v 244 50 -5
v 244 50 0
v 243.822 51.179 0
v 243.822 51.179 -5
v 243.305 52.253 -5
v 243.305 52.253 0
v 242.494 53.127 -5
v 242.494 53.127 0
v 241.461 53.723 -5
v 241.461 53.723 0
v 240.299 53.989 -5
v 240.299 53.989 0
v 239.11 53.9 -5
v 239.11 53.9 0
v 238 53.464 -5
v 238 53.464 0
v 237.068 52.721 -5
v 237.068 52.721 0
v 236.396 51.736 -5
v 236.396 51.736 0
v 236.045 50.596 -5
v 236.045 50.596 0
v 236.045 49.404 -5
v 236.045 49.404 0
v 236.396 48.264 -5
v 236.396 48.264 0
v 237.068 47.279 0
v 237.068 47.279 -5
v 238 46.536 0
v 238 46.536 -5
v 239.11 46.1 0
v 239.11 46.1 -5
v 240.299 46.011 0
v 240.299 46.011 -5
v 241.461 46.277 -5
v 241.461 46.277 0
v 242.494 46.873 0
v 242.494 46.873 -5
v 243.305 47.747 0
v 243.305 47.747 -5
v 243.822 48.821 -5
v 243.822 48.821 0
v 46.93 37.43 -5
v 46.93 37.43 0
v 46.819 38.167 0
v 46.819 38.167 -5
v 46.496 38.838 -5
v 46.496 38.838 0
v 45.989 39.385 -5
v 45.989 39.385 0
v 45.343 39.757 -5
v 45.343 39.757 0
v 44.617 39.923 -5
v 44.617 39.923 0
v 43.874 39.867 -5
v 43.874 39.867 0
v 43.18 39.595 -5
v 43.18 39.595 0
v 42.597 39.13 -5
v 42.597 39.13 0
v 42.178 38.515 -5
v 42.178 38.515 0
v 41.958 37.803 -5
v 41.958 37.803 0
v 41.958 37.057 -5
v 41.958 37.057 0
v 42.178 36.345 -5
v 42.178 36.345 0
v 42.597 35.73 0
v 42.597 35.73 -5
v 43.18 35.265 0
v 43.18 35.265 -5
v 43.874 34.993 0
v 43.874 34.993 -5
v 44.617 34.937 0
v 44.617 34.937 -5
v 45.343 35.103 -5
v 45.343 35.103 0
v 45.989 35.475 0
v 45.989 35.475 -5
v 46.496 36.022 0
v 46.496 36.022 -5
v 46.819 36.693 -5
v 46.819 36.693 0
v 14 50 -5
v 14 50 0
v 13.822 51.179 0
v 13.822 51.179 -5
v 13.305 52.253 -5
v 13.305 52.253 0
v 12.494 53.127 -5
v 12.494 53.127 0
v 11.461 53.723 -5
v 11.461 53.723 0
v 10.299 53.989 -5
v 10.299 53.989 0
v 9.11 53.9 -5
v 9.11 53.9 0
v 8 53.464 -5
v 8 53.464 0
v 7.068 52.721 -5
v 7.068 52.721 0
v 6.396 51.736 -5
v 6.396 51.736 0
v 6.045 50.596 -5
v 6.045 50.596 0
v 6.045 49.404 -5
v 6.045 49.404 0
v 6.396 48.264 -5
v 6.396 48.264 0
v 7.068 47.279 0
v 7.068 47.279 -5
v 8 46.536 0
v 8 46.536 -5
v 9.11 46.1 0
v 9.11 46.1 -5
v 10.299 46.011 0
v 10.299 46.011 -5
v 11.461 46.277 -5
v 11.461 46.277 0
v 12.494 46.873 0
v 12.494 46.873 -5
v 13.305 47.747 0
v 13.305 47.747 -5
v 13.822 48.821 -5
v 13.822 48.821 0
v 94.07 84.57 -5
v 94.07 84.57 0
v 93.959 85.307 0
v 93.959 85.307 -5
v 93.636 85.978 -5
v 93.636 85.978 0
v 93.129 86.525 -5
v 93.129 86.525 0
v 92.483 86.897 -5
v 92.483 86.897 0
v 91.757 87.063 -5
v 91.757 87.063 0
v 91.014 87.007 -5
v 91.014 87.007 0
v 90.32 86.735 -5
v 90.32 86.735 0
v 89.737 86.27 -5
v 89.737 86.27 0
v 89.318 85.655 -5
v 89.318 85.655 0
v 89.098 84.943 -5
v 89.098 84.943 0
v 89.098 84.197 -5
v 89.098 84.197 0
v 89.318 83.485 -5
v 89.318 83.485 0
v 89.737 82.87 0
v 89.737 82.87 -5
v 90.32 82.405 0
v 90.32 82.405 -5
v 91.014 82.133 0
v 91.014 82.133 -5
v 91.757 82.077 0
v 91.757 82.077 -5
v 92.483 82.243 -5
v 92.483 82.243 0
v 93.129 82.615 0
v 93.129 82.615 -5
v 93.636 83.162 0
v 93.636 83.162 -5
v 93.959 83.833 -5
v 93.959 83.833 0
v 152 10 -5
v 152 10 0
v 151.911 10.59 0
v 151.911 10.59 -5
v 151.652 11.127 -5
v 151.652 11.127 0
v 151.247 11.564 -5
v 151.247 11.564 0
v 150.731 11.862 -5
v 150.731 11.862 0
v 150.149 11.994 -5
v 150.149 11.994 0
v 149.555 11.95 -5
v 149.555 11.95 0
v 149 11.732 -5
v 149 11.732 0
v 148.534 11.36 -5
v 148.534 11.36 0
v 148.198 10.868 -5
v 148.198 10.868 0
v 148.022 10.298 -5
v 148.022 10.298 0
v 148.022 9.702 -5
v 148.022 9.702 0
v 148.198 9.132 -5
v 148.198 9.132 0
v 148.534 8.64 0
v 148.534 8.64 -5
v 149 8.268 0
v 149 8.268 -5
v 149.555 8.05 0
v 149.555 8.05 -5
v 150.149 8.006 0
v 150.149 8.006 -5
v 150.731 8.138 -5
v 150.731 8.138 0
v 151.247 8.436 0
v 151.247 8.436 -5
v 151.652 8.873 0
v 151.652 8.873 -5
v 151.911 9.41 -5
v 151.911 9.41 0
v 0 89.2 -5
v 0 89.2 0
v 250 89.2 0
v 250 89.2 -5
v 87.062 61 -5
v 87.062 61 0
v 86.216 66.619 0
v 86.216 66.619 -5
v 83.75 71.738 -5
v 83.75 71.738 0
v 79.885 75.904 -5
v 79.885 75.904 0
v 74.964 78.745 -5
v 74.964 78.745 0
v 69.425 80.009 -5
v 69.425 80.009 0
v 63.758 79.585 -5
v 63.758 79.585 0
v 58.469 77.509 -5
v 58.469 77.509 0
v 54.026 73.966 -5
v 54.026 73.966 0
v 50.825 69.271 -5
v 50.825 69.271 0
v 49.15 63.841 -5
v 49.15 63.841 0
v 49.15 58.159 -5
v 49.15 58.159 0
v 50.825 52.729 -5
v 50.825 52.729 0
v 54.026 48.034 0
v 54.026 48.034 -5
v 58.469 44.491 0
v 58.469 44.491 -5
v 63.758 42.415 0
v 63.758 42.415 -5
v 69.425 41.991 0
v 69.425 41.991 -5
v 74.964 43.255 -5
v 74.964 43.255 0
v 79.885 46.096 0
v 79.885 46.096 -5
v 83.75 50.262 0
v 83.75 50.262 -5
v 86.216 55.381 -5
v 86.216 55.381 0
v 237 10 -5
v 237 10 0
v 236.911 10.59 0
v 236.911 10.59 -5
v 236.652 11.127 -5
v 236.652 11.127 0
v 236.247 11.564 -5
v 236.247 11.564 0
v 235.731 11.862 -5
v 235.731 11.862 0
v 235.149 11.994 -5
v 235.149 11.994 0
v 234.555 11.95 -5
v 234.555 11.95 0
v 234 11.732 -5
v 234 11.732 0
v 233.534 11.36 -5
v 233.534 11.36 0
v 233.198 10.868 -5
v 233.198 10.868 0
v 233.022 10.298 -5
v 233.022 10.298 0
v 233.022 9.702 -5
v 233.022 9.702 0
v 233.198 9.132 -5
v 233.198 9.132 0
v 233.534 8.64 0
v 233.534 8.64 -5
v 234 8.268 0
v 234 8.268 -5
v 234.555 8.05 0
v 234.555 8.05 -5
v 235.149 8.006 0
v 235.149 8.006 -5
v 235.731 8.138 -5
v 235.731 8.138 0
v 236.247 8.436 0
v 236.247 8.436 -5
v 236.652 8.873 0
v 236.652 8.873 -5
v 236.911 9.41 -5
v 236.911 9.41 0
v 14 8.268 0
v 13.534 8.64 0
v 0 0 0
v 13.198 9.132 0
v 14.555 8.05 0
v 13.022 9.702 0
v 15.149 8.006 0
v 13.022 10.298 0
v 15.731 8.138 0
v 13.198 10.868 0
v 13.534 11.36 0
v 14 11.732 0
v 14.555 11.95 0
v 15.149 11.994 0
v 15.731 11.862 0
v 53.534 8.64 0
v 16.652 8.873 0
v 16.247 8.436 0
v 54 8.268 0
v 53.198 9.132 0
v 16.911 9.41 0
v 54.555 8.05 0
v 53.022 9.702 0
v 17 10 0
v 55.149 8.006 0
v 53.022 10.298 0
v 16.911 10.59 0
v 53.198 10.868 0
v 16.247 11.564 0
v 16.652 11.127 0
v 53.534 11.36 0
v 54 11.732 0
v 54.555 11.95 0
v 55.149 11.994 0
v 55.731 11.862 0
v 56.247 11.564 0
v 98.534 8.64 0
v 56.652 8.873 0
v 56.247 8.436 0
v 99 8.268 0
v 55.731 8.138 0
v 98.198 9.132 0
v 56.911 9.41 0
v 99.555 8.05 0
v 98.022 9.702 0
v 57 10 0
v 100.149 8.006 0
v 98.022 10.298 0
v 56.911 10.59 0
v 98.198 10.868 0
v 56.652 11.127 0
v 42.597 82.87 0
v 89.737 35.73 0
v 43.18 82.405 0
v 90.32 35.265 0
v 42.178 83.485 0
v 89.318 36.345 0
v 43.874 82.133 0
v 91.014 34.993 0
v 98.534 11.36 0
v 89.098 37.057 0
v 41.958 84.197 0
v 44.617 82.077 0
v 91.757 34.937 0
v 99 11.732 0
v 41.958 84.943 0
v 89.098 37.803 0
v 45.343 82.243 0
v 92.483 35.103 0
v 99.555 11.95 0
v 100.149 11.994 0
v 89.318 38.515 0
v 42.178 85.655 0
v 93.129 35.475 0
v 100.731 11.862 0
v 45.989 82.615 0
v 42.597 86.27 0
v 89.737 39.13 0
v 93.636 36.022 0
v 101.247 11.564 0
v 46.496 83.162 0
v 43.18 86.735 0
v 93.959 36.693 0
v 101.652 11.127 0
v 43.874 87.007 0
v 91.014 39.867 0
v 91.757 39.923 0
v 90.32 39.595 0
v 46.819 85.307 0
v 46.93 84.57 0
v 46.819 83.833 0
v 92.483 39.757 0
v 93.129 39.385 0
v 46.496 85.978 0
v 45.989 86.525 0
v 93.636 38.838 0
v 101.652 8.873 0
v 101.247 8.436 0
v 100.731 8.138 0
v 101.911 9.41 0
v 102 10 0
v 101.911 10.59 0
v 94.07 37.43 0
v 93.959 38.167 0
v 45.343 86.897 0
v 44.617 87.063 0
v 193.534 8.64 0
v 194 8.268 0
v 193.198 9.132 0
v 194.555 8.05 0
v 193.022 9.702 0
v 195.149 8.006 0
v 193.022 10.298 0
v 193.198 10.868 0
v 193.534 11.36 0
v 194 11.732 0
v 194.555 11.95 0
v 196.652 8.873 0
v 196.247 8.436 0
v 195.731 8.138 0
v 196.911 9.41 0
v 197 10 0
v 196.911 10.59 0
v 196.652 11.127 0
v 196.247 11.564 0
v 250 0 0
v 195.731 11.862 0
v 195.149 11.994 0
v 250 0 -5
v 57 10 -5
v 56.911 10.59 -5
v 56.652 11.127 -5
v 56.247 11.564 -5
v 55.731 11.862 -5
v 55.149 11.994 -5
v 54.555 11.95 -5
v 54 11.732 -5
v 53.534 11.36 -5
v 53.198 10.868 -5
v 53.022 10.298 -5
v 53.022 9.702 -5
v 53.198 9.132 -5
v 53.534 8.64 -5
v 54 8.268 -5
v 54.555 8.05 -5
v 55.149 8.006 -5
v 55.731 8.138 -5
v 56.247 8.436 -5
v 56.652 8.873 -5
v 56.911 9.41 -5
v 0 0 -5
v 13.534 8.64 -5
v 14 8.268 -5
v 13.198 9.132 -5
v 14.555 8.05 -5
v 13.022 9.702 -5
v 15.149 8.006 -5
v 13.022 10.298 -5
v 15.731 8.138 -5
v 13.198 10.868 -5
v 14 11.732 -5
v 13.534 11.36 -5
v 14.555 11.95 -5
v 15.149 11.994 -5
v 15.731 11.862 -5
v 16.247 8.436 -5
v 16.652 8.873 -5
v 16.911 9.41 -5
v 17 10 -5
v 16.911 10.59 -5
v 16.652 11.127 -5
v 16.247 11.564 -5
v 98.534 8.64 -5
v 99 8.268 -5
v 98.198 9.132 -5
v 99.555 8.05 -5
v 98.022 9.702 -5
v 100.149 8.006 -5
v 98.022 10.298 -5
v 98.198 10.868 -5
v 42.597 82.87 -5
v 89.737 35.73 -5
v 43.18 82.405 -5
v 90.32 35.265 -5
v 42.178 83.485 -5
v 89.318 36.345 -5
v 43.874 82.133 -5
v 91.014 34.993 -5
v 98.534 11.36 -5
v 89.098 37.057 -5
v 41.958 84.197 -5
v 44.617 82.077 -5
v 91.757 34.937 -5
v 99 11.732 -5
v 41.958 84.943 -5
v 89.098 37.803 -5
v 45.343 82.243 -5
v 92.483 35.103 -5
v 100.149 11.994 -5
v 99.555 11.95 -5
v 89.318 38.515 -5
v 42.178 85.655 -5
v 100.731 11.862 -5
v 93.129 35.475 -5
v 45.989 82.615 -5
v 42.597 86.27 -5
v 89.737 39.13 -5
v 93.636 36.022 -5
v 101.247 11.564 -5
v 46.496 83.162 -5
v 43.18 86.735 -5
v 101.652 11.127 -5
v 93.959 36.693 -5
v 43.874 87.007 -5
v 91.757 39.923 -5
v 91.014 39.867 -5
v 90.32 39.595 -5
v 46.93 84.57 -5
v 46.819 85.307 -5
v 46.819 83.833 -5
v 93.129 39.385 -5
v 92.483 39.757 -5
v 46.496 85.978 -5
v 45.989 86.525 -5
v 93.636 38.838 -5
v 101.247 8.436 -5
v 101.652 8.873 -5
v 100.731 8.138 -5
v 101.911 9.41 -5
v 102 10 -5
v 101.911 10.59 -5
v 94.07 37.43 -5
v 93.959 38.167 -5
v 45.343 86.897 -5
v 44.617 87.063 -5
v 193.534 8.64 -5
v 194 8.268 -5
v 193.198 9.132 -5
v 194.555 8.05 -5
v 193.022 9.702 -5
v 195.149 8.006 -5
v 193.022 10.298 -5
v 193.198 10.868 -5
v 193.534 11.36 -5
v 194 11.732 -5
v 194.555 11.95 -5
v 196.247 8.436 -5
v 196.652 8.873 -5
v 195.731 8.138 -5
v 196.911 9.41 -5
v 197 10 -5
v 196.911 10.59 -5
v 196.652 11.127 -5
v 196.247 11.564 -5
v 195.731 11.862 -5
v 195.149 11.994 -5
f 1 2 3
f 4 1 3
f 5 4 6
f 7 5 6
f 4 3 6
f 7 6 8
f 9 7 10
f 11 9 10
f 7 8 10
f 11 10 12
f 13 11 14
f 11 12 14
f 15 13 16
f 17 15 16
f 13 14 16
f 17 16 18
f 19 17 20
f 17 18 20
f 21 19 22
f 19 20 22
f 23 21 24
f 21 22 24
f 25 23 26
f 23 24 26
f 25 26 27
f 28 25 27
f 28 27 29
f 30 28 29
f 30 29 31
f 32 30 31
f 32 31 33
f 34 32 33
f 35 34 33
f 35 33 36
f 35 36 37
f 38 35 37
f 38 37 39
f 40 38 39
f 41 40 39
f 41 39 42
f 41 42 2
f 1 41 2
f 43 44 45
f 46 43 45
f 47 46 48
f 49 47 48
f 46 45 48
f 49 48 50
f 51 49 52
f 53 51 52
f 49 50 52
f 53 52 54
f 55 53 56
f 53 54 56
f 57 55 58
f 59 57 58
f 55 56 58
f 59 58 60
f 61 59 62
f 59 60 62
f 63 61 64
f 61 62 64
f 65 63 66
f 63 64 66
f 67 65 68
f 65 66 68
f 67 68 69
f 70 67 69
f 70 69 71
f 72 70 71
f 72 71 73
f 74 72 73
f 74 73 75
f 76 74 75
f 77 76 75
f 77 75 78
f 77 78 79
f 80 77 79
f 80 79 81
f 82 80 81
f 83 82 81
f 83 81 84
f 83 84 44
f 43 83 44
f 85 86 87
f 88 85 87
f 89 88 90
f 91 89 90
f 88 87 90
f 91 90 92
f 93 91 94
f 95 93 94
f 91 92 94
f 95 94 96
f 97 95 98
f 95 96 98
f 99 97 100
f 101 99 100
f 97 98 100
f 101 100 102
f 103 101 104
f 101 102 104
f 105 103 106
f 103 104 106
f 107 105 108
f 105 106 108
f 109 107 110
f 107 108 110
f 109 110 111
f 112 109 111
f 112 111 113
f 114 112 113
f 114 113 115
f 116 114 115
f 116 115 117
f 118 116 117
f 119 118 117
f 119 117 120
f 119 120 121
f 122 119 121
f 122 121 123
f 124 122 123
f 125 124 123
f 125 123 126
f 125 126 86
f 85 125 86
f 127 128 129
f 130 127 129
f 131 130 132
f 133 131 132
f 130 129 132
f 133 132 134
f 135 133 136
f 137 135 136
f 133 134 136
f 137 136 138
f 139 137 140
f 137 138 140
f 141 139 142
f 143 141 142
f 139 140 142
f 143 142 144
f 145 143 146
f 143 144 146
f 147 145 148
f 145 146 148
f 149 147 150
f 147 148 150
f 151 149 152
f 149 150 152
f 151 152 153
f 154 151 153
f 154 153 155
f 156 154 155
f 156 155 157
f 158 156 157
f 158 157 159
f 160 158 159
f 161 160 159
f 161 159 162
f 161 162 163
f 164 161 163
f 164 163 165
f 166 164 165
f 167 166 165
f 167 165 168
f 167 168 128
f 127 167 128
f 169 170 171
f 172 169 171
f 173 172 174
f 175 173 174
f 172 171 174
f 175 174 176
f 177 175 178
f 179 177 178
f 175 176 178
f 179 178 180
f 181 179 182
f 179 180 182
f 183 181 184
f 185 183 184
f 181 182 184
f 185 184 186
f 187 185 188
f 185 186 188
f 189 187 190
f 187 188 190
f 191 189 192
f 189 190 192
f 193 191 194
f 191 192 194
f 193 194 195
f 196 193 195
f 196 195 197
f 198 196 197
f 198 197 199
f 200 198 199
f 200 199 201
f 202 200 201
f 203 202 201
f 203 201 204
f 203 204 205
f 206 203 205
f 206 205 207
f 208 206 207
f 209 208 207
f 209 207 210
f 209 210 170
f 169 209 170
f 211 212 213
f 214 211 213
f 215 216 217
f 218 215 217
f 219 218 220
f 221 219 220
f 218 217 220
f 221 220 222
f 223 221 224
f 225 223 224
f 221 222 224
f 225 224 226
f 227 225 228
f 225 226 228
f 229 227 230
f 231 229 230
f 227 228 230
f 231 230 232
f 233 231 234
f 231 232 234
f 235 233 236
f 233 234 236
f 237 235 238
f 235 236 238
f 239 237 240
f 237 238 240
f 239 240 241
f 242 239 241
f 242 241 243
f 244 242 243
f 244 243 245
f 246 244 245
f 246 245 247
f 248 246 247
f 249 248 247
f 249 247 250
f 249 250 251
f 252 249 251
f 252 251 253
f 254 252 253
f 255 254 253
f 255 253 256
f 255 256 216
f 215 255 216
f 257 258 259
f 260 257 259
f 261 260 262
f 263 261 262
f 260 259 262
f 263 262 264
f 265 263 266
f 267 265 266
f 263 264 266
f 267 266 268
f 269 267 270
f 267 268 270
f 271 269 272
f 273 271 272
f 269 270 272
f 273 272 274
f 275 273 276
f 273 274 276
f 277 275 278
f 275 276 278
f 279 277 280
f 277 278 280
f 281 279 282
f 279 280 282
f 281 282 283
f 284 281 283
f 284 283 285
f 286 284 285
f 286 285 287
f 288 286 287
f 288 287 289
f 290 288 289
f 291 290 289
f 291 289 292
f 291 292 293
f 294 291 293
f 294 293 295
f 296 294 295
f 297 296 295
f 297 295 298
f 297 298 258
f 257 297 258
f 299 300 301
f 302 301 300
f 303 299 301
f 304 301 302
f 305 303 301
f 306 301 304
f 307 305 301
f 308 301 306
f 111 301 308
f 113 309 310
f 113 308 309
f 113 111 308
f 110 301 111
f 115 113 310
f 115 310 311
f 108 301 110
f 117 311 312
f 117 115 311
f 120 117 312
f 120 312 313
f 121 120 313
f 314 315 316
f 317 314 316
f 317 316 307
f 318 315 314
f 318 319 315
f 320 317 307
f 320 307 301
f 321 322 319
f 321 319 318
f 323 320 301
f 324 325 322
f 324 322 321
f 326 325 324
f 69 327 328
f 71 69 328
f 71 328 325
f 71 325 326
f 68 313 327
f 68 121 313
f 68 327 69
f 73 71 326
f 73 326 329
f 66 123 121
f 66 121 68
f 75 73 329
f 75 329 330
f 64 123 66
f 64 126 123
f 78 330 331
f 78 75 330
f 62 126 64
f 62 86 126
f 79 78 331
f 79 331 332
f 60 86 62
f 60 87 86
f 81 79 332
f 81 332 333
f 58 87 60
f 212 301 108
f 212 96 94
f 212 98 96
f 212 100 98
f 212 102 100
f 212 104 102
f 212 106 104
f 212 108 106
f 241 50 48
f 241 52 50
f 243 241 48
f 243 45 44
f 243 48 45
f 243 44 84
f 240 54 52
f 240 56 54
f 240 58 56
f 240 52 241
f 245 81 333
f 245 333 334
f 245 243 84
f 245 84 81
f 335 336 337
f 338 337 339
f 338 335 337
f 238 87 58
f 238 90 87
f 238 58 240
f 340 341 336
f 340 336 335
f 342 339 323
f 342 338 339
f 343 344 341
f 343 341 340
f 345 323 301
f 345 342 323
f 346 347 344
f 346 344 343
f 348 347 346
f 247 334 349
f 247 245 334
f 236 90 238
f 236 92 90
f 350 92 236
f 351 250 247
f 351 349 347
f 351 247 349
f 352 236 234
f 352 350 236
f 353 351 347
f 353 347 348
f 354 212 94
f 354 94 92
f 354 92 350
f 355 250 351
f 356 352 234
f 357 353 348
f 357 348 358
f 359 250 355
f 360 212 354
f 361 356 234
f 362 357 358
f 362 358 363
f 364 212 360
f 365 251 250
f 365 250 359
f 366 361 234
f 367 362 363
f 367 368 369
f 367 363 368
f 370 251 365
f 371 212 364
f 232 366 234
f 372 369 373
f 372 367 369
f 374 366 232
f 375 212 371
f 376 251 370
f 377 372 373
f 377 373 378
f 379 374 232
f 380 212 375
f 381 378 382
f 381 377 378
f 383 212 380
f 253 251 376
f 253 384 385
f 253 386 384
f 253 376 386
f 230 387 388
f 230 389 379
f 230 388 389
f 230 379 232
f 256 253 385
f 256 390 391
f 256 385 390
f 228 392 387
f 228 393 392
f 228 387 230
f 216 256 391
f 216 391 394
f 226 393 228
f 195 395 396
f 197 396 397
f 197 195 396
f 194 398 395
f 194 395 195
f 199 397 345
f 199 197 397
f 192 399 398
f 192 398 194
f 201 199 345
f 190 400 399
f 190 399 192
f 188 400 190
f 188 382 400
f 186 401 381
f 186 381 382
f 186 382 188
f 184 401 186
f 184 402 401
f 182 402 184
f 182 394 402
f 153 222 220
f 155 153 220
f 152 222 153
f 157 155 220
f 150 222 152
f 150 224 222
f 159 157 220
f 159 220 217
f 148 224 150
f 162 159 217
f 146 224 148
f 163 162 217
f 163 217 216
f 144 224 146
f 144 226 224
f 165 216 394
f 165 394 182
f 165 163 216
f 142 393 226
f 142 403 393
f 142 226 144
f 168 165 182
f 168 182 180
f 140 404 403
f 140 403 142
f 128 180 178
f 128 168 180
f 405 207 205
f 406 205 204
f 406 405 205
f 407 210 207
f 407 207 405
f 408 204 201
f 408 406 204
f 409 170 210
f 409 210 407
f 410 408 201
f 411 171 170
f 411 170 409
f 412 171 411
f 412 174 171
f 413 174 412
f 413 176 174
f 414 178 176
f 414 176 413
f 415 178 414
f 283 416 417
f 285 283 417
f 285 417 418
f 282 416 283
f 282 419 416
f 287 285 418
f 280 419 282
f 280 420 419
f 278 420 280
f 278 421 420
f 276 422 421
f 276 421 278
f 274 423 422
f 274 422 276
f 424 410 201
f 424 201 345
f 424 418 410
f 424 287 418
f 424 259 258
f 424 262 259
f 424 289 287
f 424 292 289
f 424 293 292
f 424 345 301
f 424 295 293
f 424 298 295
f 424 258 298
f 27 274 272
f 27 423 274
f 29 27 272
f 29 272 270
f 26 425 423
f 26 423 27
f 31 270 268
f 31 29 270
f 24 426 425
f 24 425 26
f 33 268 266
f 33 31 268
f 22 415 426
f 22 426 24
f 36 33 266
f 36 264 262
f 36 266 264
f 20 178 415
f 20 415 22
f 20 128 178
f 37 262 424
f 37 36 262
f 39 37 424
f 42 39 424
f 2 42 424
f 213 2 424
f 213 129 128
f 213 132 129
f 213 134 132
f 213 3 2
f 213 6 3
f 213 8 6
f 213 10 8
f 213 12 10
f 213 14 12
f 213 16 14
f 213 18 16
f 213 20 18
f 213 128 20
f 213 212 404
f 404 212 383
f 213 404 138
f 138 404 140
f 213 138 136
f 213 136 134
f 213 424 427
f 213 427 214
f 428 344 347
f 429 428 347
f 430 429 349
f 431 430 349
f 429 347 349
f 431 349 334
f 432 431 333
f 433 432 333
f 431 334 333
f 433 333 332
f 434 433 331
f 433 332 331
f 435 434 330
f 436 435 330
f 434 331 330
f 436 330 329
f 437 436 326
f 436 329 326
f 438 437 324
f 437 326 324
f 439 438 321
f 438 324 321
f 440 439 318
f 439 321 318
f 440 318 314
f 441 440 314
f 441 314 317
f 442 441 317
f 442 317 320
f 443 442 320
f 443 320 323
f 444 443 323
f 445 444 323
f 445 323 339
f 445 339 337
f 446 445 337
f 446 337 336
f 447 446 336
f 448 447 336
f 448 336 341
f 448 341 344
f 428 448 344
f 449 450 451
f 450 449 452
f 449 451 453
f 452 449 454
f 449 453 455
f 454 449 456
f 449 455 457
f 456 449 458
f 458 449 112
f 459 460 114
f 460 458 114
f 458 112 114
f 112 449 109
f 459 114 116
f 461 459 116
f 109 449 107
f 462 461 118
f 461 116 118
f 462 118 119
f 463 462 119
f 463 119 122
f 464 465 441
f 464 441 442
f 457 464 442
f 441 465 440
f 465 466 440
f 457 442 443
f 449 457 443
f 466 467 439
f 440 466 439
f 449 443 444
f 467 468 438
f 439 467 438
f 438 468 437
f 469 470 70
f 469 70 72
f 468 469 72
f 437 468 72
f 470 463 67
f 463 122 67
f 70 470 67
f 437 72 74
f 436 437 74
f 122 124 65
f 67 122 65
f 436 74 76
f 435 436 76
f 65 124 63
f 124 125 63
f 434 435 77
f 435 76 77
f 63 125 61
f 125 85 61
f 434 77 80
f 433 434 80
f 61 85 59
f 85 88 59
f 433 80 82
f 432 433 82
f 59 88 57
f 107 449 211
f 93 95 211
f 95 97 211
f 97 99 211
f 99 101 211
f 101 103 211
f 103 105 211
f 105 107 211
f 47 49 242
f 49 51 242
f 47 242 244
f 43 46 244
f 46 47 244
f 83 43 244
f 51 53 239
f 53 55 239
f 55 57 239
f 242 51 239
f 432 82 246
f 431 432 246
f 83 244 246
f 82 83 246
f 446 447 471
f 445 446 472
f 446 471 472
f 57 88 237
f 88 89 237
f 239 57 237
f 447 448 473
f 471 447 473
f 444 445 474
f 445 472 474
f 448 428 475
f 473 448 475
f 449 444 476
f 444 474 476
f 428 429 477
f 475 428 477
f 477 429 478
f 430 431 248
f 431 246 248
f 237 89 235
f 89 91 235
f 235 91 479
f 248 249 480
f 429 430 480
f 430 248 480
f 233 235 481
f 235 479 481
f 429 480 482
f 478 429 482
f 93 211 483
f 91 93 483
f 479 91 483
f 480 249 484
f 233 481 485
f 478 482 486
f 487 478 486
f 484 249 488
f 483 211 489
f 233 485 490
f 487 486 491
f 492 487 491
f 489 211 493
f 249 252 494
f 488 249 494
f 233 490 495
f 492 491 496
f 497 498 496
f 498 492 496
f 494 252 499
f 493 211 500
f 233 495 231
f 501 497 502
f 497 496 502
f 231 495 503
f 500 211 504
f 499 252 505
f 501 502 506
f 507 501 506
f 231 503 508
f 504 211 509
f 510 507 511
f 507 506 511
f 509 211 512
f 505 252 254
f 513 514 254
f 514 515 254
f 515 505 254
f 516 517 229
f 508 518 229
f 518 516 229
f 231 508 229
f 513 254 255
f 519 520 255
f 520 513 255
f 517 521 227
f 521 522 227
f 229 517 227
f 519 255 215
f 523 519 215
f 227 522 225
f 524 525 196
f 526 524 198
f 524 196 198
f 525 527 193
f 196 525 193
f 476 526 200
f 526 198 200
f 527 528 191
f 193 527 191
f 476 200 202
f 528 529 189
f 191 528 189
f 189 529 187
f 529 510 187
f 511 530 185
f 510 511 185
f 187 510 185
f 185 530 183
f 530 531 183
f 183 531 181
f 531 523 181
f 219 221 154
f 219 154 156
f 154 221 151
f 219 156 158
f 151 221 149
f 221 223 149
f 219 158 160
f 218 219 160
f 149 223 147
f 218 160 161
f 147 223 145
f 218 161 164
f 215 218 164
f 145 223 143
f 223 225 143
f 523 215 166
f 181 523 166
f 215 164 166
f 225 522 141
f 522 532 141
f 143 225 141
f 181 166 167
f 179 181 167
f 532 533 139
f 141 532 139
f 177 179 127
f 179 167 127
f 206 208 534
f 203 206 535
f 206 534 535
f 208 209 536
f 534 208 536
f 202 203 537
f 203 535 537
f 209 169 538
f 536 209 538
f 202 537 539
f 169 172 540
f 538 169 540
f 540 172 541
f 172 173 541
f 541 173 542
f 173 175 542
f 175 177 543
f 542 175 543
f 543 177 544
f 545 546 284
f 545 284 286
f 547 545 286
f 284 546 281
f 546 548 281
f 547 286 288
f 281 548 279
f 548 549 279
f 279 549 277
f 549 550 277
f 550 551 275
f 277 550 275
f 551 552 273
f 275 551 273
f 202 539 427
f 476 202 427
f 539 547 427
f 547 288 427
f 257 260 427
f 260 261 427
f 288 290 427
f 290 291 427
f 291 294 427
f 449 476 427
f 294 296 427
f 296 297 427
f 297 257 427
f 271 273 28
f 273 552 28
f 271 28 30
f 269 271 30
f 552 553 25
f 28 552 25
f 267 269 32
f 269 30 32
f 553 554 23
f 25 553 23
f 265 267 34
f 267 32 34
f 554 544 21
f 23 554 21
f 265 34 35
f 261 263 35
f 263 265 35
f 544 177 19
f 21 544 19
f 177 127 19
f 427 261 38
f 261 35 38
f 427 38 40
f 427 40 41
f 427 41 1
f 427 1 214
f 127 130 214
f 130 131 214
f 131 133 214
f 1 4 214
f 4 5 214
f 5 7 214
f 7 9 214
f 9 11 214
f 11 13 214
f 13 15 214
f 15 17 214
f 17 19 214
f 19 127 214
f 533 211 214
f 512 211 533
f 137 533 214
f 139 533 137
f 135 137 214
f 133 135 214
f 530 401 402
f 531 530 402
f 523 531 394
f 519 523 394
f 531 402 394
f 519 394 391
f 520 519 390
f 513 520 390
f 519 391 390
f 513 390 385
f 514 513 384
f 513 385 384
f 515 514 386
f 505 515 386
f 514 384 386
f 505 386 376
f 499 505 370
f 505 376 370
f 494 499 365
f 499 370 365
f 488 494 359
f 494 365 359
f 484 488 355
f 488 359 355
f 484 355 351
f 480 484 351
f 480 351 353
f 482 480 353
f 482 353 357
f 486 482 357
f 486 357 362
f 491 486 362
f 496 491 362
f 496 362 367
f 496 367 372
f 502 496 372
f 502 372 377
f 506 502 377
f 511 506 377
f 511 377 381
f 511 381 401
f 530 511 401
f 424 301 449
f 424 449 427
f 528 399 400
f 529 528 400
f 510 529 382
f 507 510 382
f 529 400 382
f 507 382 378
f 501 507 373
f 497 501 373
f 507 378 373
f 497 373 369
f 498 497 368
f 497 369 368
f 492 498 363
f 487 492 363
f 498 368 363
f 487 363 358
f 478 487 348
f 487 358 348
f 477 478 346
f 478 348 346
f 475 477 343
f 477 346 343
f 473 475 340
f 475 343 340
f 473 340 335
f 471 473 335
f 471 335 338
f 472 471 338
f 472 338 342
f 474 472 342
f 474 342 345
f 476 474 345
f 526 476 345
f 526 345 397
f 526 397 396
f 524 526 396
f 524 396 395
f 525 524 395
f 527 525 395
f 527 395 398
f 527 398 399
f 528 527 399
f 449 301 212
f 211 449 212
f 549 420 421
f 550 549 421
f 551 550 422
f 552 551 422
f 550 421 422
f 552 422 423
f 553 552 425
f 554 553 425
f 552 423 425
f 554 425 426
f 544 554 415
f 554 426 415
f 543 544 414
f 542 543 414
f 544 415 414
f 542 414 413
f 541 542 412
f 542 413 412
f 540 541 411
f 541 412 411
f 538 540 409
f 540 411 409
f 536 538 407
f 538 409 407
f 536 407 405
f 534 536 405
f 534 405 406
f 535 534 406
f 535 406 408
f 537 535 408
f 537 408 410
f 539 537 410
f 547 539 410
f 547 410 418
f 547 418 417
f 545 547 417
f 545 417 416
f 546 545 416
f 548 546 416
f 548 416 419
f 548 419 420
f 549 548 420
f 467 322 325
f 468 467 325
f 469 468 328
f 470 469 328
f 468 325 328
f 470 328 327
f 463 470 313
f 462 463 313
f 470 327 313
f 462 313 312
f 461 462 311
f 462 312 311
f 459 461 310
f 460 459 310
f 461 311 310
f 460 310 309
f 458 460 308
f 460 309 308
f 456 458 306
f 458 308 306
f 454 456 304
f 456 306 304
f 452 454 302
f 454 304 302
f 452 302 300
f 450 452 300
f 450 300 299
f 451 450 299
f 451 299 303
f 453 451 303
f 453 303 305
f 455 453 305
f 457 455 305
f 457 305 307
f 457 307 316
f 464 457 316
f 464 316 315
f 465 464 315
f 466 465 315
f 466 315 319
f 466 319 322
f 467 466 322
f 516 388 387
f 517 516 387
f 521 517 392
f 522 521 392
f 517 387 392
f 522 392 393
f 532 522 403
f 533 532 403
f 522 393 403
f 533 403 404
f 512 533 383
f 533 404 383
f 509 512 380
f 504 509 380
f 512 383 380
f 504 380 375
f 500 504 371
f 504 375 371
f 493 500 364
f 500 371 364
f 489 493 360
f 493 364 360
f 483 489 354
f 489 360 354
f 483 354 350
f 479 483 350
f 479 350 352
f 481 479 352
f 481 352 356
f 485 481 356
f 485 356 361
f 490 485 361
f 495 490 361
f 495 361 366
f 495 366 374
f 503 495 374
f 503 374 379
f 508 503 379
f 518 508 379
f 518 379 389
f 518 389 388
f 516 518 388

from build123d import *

# Parameters (mm, degrees)
SKIZZE1_W                       = 250
SKIZZE1_H                       = 89.2
AUFSATZ_LINEAR_AUSTRAGEN1_DEPTH = 5
SKIZZE2_R                       = 19.0625
SCHNITT_LINEAR_AUSTRAGEN1_DEPTH = 27
SKIZZE3_R                       = 2
SCHNITT_LINEAR_AUSTRAGEN2_DEPTH = 10
SKIZZE4_R                       = 4
SCHNITT_LINEAR_AUSTRAGEN3_DEPTH = 10
SKIZZE5_R                       = 2.5
SCHNITT_LINEAR_AUSTRAGEN4_DEPTH = 10
SKIZZE6_R                       = 2
SCHNITT_LINEAR_AUSTRAGEN5_DEPTH = 10


with BuildPart() as part:
    # Skizze1 → Aufsatz-Linear austragen1 (new body)
    with BuildSketch(Plane.XY):
        with Locations((125, 44.6)):
            Rectangle(SKIZZE1_W, SKIZZE1_H)
    extrude(amount=-AUFSATZ_LINEAR_AUSTRAGEN1_DEPTH)

    # Skizze2 → Schnitt-Linear austragen1 (cut)
    with BuildSketch(Plane.XY):
        with Locations((68, 61)):
            Circle(SKIZZE2_R)
    extrude(amount=-SCHNITT_LINEAR_AUSTRAGEN1_DEPTH, mode=Mode.SUBTRACT)

    # Skizze3 → Schnitt-Linear austragen2 (cut)
    with BuildSketch(Plane.XY):
        with Locations((15, 10)):
            Circle(SKIZZE3_R)
        with Locations((55, 10)):
            Circle(SKIZZE3_R)
        with Locations((195, 10)):
            Circle(SKIZZE3_R)
        with Locations((235, 10)):
            Circle(SKIZZE3_R)
        with Locations((150, 10)):
            Circle(SKIZZE3_R)
    extrude(amount=-SCHNITT_LINEAR_AUSTRAGEN2_DEPTH, mode=Mode.SUBTRACT)

    # Skizze4 → Schnitt-Linear austragen3 (cut)
    with BuildSketch(Plane.XY):
        with Locations((10, 50)):
            Circle(SKIZZE4_R)
        with Locations((240, 50)):
            Circle(SKIZZE4_R)
    extrude(amount=-SCHNITT_LINEAR_AUSTRAGEN3_DEPTH, mode=Mode.SUBTRACT)

    # Skizze5 → Schnitt-Linear austragen4 (cut)
    with BuildSketch(Plane.XY):
        with Locations((44.43, 84.57)):
            Circle(SKIZZE5_R)
        with Locations((91.57, 84.57)):
            Circle(SKIZZE5_R)
        with Locations((91.57, 37.43)):
            Circle(SKIZZE5_R)
        with Locations((44.43, 37.43)):
            Circle(SKIZZE5_R)
    extrude(amount=-SCHNITT_LINEAR_AUSTRAGEN4_DEPTH, mode=Mode.SUBTRACT)

    # Skizze6 → Schnitt-Linear austragen5 (cut)
    with BuildSketch(Plane.XY):
        with Locations((100, 10)):
            Circle(SKIZZE6_R)
    extrude(amount=-SCHNITT_LINEAR_AUSTRAGEN5_DEPTH, mode=Mode.SUBTRACT)


solid = part.part
